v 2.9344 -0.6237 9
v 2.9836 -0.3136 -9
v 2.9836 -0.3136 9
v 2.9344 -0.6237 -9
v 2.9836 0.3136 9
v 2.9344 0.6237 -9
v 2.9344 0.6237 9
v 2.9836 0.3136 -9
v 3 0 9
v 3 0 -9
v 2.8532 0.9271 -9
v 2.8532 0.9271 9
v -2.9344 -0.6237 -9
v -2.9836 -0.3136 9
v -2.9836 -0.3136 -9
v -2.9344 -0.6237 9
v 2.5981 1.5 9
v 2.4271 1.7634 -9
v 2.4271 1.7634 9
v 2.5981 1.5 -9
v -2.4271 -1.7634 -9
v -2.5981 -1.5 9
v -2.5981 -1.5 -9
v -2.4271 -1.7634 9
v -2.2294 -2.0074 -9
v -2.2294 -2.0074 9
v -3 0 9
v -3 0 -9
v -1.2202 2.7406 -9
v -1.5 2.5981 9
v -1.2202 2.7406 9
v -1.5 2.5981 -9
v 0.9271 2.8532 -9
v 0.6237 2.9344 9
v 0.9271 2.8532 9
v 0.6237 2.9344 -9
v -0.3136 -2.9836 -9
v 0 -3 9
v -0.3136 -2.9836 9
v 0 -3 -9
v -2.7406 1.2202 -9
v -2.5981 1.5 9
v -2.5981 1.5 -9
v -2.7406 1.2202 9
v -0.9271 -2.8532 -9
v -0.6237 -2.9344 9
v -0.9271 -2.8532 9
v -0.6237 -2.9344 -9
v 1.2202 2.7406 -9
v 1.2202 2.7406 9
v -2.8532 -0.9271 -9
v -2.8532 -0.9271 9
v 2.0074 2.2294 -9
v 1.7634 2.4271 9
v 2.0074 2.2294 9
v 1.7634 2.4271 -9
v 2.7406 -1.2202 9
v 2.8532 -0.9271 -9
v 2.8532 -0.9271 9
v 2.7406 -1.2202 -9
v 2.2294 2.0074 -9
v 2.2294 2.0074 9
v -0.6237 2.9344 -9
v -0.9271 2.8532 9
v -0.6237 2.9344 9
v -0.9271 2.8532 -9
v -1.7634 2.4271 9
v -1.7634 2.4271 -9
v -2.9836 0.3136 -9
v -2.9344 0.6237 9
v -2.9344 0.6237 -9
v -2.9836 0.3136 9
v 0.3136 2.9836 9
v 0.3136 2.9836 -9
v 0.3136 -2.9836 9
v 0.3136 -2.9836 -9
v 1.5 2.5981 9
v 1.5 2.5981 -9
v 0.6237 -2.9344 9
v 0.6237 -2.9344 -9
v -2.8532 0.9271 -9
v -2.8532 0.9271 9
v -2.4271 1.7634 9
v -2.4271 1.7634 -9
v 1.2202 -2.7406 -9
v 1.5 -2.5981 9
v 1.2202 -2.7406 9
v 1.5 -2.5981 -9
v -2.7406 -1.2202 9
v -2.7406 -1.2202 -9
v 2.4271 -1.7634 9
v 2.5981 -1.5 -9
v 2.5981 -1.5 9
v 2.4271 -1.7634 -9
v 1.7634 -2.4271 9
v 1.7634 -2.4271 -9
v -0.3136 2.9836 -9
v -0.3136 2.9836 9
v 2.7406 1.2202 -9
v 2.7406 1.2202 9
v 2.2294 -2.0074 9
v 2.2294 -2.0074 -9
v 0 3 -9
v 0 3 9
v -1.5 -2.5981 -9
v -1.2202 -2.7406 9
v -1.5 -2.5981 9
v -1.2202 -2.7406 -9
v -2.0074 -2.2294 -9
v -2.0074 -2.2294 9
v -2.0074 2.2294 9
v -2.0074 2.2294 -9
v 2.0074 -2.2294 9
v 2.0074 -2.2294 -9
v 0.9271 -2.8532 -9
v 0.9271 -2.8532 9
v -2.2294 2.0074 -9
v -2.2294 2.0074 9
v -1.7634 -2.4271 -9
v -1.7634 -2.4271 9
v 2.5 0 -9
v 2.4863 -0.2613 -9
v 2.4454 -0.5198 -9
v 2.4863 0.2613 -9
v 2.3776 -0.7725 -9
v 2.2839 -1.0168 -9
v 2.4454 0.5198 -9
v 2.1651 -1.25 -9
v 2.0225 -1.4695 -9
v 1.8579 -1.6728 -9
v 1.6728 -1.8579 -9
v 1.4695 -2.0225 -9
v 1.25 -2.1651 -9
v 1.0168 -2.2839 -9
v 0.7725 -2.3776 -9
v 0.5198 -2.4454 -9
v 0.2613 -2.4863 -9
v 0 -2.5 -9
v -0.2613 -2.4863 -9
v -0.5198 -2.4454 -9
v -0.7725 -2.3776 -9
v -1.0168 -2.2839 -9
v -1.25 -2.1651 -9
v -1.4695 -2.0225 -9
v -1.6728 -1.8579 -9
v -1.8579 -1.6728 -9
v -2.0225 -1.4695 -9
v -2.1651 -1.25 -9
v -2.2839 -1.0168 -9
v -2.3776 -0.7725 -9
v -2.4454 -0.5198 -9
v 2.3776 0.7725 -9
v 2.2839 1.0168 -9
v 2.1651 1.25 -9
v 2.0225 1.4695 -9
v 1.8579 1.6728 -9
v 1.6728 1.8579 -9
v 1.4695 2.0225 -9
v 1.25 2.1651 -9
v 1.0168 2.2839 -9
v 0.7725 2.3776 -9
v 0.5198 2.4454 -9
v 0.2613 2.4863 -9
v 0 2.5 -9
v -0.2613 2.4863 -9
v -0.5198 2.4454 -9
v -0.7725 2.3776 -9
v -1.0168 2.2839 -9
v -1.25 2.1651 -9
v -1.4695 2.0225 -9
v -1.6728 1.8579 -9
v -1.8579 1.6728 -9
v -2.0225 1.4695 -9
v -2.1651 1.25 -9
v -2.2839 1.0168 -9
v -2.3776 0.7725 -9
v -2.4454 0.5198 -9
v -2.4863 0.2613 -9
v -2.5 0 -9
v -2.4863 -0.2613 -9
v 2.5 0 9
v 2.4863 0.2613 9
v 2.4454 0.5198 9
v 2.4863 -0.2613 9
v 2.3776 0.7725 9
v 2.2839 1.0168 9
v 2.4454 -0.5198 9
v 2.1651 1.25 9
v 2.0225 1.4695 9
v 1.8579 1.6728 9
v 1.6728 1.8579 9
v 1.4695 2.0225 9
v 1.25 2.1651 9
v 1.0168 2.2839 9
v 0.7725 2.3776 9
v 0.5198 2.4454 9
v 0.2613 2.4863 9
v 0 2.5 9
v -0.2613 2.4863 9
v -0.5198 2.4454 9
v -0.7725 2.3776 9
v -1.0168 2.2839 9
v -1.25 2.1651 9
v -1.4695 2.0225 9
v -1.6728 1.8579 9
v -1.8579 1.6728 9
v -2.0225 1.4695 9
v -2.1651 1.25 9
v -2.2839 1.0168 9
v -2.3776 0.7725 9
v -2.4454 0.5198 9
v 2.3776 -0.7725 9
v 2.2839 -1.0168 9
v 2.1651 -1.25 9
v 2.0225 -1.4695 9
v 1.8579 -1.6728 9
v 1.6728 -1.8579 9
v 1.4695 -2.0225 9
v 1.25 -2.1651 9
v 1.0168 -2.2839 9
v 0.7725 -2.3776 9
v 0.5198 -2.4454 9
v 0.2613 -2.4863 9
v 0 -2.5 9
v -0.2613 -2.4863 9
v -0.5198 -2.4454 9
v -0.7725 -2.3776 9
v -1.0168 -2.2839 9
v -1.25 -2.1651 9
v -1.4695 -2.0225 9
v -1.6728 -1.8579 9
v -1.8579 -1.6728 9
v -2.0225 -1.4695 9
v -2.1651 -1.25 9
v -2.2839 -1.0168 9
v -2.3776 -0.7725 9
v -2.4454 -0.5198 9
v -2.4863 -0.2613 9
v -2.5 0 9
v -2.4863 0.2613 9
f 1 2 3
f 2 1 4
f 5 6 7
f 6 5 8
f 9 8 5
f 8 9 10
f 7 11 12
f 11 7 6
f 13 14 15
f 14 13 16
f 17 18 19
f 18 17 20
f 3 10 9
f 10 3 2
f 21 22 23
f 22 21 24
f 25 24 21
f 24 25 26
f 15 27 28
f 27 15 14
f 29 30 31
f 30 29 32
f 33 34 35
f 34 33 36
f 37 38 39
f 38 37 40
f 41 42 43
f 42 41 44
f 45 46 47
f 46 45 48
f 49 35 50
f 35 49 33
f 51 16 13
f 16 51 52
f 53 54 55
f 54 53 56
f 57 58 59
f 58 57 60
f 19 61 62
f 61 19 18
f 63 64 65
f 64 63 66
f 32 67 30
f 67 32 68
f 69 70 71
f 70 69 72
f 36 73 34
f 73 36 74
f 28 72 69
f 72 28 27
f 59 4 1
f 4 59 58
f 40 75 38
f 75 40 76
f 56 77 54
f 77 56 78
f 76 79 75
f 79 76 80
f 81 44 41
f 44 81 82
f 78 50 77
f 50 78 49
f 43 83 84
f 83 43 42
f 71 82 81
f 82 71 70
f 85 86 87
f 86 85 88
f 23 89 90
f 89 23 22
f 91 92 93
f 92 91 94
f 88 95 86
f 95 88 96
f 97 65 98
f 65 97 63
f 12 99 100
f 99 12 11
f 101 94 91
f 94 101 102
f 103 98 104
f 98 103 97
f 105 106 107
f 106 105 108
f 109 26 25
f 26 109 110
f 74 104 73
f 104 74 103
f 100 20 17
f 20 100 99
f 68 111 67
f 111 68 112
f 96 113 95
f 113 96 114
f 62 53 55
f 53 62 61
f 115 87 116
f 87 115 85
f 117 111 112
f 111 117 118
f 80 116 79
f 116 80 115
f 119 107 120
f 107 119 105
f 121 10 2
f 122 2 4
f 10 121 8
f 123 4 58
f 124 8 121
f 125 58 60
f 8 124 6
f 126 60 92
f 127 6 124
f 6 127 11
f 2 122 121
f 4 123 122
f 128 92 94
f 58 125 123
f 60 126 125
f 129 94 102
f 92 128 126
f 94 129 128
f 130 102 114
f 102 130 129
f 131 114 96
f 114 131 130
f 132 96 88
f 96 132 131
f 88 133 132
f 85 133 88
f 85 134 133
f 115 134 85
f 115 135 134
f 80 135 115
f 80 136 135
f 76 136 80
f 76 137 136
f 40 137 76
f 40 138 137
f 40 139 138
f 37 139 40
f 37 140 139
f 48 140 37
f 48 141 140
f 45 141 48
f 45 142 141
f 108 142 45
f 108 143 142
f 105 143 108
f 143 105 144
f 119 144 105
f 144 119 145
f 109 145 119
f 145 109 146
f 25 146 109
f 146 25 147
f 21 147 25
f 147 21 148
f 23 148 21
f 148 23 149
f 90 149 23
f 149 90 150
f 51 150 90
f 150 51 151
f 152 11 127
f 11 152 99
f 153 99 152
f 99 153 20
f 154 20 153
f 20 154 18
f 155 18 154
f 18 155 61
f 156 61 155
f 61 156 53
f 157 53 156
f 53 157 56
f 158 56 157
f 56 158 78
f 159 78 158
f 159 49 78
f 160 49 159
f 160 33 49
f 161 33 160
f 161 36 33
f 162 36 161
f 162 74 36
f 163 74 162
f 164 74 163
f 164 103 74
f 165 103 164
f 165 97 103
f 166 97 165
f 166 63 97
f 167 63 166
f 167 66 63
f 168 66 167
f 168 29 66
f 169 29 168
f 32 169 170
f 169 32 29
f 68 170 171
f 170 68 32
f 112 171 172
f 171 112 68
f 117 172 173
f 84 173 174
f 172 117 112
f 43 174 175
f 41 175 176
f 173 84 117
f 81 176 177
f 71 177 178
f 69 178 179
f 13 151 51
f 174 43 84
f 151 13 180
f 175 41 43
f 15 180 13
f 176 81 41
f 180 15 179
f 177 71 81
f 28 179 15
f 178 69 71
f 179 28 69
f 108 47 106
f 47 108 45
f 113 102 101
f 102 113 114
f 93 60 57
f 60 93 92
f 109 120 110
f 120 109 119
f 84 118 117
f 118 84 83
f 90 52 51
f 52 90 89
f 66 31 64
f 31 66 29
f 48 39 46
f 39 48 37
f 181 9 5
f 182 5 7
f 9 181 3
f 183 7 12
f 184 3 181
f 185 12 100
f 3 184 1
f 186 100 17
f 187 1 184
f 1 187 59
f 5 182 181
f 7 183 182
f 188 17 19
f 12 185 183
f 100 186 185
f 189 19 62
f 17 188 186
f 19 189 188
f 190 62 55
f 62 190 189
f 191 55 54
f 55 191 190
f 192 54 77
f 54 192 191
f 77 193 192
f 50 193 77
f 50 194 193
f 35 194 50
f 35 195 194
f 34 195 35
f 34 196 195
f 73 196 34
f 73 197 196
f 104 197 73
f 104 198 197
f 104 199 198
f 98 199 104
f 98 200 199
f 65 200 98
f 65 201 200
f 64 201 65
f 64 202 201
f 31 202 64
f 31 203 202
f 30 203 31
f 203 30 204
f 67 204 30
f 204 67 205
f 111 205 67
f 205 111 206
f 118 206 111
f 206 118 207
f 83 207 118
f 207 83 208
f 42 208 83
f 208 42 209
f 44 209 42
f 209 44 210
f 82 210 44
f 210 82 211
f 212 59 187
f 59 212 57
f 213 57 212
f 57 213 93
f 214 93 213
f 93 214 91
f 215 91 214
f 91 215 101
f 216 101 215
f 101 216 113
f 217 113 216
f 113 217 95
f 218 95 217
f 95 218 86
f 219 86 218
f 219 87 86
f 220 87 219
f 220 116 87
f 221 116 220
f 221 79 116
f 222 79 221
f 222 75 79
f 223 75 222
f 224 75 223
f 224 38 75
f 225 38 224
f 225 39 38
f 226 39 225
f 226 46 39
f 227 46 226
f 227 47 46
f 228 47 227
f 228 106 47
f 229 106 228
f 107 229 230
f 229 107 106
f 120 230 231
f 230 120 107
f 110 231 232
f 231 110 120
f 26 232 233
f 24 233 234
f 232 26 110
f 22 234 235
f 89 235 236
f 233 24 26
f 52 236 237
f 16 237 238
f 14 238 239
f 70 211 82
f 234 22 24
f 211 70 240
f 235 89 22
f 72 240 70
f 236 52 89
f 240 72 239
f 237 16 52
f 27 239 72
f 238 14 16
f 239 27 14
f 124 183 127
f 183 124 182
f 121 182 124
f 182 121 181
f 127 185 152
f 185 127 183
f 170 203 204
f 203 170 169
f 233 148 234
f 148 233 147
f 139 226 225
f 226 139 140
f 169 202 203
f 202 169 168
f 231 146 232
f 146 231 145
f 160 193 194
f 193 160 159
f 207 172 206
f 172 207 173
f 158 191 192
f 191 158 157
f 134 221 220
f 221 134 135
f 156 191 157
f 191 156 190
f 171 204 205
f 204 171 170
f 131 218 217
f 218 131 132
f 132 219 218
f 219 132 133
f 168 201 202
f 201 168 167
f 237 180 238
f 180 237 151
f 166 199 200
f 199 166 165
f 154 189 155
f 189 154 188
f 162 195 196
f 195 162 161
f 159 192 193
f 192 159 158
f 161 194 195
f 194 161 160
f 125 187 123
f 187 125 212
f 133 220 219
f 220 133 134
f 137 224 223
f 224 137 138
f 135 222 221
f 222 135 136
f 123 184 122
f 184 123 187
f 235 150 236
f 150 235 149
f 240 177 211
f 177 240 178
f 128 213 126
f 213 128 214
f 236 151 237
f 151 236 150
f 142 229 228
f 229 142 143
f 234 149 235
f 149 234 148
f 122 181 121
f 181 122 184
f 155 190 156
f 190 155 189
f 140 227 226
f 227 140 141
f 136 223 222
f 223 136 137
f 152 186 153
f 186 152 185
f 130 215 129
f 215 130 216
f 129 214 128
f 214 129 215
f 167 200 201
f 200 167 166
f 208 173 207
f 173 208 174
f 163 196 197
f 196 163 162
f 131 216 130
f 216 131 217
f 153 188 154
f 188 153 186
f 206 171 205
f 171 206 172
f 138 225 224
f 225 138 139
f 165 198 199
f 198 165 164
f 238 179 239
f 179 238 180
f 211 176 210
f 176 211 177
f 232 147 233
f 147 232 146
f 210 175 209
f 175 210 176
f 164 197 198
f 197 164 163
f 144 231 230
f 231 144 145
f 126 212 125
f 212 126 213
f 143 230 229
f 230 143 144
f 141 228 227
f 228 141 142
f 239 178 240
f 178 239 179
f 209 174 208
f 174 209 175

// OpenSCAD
$fn=60;

module spacer()
  difference() {
    union() {
        cylinder(r=6/2, h=18, center=true);
    //    cylinder(r=8/2, h=6, center=true);
    }
    cylinder(r=5/2, h=19, center=true);
  }
  

spacer();
//translate([20, 0, 0])
  //  spacer();
